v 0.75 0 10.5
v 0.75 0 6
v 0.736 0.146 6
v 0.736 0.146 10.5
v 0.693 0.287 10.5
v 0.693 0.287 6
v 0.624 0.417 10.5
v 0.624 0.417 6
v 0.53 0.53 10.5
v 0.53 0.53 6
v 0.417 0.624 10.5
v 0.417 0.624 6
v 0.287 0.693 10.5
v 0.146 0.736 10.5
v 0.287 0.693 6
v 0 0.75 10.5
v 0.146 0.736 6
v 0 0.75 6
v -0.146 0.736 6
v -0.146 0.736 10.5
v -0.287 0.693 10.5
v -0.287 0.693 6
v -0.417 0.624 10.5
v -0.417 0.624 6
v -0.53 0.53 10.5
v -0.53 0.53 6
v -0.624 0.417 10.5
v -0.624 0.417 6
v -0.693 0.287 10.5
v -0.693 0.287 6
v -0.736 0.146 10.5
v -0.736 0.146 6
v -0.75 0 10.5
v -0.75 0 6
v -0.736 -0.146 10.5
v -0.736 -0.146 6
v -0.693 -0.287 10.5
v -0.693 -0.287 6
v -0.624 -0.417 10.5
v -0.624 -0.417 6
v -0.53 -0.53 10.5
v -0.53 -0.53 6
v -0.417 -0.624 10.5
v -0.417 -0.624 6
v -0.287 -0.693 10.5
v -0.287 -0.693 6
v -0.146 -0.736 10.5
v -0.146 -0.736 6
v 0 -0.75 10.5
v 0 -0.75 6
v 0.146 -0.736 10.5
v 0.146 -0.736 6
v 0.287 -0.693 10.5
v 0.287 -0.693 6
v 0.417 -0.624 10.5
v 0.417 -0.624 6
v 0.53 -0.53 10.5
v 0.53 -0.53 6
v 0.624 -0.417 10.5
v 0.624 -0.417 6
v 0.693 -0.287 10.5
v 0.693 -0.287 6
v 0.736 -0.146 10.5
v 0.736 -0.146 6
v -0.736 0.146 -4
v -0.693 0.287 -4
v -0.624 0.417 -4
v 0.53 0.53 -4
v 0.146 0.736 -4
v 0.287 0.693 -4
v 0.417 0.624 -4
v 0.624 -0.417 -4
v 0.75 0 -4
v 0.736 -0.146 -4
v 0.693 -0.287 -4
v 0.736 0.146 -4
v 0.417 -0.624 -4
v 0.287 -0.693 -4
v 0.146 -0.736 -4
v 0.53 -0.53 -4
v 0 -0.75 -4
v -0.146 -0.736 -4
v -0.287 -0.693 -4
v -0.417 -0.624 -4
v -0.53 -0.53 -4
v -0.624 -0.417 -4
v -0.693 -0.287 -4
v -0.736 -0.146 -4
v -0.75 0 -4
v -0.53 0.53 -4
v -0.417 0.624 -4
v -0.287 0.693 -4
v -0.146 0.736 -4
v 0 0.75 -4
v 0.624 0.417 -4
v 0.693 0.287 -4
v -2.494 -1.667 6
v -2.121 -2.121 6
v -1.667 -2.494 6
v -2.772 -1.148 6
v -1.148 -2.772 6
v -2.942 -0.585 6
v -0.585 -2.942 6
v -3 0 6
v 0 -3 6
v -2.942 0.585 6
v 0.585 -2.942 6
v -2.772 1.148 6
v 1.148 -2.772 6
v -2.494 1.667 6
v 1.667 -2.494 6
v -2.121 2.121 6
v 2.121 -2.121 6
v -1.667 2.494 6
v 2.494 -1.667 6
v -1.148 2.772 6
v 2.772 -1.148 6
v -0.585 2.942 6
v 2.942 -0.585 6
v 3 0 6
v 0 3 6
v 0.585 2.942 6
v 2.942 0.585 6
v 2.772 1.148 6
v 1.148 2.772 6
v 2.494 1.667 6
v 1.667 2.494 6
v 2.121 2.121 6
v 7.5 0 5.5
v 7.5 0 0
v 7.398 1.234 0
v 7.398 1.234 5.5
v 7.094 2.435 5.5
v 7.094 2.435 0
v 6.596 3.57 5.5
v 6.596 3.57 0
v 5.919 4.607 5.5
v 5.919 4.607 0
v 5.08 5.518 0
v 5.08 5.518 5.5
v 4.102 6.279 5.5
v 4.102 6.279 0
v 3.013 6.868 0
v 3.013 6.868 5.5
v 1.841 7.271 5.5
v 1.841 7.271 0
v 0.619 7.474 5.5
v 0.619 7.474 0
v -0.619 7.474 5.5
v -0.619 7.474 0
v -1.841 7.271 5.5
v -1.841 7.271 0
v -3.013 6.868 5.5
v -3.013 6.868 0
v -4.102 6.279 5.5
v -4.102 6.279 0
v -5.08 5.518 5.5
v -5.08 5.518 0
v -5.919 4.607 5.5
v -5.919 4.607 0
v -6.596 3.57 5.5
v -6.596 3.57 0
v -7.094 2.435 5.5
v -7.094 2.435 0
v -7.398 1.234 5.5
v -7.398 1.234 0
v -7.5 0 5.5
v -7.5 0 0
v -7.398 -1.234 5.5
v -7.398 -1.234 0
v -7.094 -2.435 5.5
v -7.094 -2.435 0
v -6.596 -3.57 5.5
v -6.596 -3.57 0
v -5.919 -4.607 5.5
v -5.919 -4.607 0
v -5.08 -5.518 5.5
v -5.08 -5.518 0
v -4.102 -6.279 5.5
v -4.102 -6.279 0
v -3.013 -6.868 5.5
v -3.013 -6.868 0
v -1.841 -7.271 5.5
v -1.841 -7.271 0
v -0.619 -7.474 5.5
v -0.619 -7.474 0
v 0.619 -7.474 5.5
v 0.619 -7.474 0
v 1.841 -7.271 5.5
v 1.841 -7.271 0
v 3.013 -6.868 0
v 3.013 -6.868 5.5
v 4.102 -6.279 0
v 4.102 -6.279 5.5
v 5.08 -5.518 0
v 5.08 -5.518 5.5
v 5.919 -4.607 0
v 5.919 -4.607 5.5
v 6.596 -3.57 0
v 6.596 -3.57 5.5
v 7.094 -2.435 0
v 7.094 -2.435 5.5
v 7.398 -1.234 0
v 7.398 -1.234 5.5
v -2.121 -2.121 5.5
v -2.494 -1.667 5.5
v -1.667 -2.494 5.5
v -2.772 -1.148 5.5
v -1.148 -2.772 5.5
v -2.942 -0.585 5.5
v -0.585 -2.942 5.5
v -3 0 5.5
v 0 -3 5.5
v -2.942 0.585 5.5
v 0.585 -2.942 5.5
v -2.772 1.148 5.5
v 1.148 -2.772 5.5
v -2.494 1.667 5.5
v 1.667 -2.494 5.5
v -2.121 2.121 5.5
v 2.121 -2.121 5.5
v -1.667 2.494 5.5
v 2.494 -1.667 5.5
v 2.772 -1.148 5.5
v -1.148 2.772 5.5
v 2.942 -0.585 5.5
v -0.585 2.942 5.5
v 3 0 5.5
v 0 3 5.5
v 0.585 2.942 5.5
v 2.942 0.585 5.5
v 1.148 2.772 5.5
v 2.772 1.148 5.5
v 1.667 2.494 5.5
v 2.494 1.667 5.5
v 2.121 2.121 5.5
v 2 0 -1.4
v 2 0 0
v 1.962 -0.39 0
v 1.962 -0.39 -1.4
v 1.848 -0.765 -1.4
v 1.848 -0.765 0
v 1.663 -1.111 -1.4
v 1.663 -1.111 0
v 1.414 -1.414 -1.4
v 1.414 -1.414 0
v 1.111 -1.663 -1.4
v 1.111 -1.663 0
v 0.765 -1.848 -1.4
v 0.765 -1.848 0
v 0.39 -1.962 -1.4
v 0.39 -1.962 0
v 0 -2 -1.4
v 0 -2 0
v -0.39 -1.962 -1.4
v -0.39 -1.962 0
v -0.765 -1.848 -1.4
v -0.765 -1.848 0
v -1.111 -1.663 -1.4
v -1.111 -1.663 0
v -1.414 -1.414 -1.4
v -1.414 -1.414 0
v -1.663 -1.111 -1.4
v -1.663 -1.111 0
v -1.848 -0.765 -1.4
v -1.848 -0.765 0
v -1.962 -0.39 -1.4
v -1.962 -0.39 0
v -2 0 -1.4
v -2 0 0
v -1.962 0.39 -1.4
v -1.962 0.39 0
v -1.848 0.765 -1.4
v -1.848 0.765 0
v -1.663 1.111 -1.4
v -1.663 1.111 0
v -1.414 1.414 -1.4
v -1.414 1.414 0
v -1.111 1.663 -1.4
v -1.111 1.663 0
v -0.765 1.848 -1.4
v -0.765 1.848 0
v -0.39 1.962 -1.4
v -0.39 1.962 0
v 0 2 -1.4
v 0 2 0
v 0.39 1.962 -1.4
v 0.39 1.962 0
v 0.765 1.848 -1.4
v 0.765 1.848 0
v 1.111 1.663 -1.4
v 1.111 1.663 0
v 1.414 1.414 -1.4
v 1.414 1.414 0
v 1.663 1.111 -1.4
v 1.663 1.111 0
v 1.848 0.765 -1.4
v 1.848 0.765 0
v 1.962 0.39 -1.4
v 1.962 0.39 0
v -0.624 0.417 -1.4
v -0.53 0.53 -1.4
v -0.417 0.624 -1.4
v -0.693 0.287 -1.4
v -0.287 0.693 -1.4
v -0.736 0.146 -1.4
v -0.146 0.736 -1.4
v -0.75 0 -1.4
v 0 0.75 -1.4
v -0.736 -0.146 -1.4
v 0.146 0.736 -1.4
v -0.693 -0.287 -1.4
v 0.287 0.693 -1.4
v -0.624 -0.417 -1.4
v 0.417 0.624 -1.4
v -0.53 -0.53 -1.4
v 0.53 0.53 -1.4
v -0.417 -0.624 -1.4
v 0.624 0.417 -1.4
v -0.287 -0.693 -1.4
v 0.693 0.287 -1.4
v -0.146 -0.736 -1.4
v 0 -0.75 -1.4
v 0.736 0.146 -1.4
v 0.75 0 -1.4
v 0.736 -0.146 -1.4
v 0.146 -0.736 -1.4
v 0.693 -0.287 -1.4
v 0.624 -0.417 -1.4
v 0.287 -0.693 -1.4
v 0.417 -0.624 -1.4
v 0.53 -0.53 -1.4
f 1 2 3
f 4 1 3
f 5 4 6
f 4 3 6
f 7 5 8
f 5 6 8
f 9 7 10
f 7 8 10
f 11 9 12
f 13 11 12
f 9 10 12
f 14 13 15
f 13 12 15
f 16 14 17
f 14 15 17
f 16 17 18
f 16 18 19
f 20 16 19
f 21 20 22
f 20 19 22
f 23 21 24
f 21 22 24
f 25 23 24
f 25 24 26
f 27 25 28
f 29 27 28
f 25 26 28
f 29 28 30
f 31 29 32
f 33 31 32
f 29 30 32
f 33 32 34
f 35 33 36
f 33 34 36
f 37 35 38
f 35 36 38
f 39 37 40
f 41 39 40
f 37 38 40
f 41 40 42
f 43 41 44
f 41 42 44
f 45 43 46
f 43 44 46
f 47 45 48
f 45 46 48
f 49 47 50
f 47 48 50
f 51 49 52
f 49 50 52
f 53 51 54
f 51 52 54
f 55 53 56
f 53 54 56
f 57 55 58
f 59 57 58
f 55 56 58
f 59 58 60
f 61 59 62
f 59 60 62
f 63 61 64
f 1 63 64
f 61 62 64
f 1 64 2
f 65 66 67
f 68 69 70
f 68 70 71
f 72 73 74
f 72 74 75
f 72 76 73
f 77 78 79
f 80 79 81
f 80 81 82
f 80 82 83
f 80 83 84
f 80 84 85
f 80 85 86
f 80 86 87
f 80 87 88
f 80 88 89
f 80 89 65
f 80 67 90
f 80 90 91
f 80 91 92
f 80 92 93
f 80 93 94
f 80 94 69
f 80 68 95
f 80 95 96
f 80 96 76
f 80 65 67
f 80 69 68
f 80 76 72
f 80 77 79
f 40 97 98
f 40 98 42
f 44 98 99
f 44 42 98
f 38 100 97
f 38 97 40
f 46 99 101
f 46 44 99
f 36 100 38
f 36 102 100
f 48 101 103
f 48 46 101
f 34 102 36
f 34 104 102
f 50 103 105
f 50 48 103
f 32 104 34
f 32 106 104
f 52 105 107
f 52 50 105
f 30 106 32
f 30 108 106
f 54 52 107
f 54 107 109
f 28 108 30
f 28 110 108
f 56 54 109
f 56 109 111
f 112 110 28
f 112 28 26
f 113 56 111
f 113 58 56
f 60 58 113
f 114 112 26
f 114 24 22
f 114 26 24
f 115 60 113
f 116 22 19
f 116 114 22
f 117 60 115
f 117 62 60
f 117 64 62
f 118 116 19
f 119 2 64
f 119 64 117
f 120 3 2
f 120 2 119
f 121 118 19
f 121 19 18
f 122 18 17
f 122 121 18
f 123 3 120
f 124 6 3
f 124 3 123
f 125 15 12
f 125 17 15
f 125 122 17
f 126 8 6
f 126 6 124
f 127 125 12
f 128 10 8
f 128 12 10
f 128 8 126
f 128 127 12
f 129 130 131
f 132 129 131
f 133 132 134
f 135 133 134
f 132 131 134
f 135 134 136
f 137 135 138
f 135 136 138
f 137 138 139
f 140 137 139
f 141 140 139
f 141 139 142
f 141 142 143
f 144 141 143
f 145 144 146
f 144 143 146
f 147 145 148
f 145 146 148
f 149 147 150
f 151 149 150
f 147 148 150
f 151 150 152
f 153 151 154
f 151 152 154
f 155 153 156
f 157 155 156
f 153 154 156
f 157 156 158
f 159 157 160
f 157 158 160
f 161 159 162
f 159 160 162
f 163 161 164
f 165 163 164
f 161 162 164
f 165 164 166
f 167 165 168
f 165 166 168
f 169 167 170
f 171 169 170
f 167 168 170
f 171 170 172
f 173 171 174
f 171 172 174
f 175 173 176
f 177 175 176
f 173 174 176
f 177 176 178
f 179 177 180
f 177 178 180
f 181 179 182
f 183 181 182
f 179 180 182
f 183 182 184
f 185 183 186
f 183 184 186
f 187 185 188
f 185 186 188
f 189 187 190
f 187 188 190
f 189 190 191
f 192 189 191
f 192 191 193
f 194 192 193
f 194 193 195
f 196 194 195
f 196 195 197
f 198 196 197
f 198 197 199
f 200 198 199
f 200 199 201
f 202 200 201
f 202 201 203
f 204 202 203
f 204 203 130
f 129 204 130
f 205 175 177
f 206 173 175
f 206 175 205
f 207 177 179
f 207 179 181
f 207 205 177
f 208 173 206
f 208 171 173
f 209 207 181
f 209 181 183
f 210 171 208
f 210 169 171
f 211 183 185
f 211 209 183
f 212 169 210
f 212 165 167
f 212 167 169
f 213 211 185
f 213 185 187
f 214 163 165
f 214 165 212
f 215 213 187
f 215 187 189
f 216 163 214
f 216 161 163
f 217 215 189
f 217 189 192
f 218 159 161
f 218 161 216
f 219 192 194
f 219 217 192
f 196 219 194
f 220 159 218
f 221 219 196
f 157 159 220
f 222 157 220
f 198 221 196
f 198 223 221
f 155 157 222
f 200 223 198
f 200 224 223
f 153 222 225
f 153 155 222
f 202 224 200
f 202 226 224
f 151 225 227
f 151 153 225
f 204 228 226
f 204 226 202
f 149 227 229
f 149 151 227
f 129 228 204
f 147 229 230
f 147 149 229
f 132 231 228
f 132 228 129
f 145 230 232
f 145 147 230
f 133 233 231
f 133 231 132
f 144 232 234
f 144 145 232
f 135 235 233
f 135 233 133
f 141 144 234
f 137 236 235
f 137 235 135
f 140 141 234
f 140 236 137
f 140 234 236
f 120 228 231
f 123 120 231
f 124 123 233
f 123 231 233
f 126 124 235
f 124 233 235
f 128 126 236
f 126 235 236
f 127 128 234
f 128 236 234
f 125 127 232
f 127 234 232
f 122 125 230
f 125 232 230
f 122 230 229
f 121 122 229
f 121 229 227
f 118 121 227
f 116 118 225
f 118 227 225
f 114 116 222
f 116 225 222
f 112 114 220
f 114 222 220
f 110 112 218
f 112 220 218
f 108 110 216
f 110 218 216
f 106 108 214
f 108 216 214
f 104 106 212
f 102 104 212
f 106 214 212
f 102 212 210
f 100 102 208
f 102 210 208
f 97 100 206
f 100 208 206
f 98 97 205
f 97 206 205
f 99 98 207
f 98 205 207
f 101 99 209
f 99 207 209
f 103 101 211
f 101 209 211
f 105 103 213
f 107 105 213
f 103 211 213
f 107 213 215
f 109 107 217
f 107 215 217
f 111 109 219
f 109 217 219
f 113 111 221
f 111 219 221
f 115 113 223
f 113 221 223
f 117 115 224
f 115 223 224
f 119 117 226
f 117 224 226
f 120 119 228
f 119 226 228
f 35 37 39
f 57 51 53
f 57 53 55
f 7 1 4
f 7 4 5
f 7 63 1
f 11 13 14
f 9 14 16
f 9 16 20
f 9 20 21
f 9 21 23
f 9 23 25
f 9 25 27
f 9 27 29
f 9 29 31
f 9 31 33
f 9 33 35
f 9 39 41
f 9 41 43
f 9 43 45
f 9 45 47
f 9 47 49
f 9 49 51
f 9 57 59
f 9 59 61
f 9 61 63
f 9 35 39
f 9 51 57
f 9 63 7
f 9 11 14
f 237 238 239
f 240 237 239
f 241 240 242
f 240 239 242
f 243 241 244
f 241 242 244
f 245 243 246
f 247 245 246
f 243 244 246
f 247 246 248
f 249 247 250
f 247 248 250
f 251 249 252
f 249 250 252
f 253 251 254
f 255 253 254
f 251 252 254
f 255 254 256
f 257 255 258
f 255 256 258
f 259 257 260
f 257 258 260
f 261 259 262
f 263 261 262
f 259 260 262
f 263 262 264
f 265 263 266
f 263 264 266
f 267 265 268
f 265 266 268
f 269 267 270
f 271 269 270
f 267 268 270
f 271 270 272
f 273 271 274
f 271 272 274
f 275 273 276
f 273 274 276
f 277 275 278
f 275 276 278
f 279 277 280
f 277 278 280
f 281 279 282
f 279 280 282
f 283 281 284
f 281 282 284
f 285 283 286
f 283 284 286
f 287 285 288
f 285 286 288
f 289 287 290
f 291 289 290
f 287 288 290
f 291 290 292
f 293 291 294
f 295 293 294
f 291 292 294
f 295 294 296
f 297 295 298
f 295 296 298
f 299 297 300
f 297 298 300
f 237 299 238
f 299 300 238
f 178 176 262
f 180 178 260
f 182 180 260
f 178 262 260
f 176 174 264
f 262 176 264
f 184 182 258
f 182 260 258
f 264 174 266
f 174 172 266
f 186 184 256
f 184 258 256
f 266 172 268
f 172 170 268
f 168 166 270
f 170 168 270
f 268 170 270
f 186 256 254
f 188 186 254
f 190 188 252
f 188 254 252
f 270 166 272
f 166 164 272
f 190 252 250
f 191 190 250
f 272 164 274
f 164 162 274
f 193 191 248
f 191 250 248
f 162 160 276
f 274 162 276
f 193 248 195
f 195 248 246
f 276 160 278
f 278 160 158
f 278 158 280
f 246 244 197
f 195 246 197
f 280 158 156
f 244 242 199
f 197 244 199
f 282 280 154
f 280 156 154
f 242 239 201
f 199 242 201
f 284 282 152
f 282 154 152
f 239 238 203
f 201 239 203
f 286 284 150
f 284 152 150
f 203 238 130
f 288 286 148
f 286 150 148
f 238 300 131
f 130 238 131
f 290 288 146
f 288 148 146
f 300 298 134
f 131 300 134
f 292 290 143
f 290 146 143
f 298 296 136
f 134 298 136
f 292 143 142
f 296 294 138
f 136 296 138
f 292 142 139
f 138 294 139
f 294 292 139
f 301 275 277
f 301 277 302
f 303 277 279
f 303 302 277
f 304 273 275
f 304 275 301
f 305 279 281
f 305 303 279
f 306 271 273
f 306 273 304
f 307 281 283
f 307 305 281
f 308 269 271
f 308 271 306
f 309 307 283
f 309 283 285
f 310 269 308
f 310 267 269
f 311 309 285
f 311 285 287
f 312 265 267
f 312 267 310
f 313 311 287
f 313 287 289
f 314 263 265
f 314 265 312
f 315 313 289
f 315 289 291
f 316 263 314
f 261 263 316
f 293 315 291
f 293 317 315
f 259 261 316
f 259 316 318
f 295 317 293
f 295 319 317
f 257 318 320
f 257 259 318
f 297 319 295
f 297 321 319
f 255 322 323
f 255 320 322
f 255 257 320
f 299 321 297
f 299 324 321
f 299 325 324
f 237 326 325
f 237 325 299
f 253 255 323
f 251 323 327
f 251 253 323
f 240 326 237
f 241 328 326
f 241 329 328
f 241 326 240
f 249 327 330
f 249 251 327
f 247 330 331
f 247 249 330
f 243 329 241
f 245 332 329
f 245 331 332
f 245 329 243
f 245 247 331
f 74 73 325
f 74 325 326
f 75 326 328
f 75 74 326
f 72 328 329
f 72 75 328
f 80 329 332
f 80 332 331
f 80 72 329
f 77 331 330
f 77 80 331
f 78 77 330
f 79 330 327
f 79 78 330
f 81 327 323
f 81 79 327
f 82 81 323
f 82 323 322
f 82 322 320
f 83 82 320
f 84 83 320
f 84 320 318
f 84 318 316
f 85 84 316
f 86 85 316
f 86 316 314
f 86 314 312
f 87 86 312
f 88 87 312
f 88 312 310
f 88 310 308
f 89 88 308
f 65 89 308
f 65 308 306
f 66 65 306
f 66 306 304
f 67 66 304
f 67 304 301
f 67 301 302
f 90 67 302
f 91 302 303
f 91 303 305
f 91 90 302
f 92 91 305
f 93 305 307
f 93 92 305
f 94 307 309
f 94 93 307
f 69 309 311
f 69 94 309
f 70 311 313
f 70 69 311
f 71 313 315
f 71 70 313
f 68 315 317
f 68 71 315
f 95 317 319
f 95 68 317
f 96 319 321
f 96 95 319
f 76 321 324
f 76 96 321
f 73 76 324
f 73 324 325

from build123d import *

# Parameters (mm, degrees)
ESQUISSE1_R        = 7.5
BOSS_EXTRU_1_DEPTH = 5.5
ESQUISSE2_R        = 3
BOSS_EXTRU_2_DEPTH = 0.5
ESQUISSE3_R        = 0.75
BOSS_EXTRU_3_DEPTH = 4.5
ESQUISSE4_R        = 2
BOSS_EXTRU_4_DEPTH = 1.4
BOSS_EXTRU_5_START = 4
ESQUISSE5_R        = 0.75
BOSS_EXTRU_5_DEPTH = 4


with BuildPart() as part:
    # Esquisse1 → Boss.-Extru.1 (new body)
    with BuildSketch(Plane.XY):
        Circle(ESQUISSE1_R)
    extrude(amount=BOSS_EXTRU_1_DEPTH)

    # Esquisse2 → Boss.-Extru.2 (add)
    with BuildSketch(Plane.XY.offset(5.5)):
        Circle(ESQUISSE2_R)
    extrude(amount=BOSS_EXTRU_2_DEPTH)

    # Esquisse3 → Boss.-Extru.3 (add)
    with BuildSketch(Plane.XY.offset(6)):
        Circle(ESQUISSE3_R)
    extrude(amount=BOSS_EXTRU_3_DEPTH)

    # Esquisse4 → Boss.-Extru.4 (add)
    with BuildSketch(Plane(origin=(0, 0, 0), x_dir=(-1, 0, 0), z_dir=(0, 0, -1))):
        with Locations(Location((0, 0, 0), (0, 0, 180))):
            Circle(ESQUISSE4_R)
    extrude(amount=BOSS_EXTRU_4_DEPTH)

    # Esquisse5 → Boss.-Extru.5 (add)
    with BuildSketch(Plane(origin=(0, 0, 0), x_dir=(-1, 0, 0), z_dir=(0, 0, -1)).offset(BOSS_EXTRU_5_START)):
        with Locations(Location((0, 0, 0), (0, 0, 180))):
            Circle(ESQUISSE5_R)
    extrude(amount=-BOSS_EXTRU_5_DEPTH)


solid = part.part
